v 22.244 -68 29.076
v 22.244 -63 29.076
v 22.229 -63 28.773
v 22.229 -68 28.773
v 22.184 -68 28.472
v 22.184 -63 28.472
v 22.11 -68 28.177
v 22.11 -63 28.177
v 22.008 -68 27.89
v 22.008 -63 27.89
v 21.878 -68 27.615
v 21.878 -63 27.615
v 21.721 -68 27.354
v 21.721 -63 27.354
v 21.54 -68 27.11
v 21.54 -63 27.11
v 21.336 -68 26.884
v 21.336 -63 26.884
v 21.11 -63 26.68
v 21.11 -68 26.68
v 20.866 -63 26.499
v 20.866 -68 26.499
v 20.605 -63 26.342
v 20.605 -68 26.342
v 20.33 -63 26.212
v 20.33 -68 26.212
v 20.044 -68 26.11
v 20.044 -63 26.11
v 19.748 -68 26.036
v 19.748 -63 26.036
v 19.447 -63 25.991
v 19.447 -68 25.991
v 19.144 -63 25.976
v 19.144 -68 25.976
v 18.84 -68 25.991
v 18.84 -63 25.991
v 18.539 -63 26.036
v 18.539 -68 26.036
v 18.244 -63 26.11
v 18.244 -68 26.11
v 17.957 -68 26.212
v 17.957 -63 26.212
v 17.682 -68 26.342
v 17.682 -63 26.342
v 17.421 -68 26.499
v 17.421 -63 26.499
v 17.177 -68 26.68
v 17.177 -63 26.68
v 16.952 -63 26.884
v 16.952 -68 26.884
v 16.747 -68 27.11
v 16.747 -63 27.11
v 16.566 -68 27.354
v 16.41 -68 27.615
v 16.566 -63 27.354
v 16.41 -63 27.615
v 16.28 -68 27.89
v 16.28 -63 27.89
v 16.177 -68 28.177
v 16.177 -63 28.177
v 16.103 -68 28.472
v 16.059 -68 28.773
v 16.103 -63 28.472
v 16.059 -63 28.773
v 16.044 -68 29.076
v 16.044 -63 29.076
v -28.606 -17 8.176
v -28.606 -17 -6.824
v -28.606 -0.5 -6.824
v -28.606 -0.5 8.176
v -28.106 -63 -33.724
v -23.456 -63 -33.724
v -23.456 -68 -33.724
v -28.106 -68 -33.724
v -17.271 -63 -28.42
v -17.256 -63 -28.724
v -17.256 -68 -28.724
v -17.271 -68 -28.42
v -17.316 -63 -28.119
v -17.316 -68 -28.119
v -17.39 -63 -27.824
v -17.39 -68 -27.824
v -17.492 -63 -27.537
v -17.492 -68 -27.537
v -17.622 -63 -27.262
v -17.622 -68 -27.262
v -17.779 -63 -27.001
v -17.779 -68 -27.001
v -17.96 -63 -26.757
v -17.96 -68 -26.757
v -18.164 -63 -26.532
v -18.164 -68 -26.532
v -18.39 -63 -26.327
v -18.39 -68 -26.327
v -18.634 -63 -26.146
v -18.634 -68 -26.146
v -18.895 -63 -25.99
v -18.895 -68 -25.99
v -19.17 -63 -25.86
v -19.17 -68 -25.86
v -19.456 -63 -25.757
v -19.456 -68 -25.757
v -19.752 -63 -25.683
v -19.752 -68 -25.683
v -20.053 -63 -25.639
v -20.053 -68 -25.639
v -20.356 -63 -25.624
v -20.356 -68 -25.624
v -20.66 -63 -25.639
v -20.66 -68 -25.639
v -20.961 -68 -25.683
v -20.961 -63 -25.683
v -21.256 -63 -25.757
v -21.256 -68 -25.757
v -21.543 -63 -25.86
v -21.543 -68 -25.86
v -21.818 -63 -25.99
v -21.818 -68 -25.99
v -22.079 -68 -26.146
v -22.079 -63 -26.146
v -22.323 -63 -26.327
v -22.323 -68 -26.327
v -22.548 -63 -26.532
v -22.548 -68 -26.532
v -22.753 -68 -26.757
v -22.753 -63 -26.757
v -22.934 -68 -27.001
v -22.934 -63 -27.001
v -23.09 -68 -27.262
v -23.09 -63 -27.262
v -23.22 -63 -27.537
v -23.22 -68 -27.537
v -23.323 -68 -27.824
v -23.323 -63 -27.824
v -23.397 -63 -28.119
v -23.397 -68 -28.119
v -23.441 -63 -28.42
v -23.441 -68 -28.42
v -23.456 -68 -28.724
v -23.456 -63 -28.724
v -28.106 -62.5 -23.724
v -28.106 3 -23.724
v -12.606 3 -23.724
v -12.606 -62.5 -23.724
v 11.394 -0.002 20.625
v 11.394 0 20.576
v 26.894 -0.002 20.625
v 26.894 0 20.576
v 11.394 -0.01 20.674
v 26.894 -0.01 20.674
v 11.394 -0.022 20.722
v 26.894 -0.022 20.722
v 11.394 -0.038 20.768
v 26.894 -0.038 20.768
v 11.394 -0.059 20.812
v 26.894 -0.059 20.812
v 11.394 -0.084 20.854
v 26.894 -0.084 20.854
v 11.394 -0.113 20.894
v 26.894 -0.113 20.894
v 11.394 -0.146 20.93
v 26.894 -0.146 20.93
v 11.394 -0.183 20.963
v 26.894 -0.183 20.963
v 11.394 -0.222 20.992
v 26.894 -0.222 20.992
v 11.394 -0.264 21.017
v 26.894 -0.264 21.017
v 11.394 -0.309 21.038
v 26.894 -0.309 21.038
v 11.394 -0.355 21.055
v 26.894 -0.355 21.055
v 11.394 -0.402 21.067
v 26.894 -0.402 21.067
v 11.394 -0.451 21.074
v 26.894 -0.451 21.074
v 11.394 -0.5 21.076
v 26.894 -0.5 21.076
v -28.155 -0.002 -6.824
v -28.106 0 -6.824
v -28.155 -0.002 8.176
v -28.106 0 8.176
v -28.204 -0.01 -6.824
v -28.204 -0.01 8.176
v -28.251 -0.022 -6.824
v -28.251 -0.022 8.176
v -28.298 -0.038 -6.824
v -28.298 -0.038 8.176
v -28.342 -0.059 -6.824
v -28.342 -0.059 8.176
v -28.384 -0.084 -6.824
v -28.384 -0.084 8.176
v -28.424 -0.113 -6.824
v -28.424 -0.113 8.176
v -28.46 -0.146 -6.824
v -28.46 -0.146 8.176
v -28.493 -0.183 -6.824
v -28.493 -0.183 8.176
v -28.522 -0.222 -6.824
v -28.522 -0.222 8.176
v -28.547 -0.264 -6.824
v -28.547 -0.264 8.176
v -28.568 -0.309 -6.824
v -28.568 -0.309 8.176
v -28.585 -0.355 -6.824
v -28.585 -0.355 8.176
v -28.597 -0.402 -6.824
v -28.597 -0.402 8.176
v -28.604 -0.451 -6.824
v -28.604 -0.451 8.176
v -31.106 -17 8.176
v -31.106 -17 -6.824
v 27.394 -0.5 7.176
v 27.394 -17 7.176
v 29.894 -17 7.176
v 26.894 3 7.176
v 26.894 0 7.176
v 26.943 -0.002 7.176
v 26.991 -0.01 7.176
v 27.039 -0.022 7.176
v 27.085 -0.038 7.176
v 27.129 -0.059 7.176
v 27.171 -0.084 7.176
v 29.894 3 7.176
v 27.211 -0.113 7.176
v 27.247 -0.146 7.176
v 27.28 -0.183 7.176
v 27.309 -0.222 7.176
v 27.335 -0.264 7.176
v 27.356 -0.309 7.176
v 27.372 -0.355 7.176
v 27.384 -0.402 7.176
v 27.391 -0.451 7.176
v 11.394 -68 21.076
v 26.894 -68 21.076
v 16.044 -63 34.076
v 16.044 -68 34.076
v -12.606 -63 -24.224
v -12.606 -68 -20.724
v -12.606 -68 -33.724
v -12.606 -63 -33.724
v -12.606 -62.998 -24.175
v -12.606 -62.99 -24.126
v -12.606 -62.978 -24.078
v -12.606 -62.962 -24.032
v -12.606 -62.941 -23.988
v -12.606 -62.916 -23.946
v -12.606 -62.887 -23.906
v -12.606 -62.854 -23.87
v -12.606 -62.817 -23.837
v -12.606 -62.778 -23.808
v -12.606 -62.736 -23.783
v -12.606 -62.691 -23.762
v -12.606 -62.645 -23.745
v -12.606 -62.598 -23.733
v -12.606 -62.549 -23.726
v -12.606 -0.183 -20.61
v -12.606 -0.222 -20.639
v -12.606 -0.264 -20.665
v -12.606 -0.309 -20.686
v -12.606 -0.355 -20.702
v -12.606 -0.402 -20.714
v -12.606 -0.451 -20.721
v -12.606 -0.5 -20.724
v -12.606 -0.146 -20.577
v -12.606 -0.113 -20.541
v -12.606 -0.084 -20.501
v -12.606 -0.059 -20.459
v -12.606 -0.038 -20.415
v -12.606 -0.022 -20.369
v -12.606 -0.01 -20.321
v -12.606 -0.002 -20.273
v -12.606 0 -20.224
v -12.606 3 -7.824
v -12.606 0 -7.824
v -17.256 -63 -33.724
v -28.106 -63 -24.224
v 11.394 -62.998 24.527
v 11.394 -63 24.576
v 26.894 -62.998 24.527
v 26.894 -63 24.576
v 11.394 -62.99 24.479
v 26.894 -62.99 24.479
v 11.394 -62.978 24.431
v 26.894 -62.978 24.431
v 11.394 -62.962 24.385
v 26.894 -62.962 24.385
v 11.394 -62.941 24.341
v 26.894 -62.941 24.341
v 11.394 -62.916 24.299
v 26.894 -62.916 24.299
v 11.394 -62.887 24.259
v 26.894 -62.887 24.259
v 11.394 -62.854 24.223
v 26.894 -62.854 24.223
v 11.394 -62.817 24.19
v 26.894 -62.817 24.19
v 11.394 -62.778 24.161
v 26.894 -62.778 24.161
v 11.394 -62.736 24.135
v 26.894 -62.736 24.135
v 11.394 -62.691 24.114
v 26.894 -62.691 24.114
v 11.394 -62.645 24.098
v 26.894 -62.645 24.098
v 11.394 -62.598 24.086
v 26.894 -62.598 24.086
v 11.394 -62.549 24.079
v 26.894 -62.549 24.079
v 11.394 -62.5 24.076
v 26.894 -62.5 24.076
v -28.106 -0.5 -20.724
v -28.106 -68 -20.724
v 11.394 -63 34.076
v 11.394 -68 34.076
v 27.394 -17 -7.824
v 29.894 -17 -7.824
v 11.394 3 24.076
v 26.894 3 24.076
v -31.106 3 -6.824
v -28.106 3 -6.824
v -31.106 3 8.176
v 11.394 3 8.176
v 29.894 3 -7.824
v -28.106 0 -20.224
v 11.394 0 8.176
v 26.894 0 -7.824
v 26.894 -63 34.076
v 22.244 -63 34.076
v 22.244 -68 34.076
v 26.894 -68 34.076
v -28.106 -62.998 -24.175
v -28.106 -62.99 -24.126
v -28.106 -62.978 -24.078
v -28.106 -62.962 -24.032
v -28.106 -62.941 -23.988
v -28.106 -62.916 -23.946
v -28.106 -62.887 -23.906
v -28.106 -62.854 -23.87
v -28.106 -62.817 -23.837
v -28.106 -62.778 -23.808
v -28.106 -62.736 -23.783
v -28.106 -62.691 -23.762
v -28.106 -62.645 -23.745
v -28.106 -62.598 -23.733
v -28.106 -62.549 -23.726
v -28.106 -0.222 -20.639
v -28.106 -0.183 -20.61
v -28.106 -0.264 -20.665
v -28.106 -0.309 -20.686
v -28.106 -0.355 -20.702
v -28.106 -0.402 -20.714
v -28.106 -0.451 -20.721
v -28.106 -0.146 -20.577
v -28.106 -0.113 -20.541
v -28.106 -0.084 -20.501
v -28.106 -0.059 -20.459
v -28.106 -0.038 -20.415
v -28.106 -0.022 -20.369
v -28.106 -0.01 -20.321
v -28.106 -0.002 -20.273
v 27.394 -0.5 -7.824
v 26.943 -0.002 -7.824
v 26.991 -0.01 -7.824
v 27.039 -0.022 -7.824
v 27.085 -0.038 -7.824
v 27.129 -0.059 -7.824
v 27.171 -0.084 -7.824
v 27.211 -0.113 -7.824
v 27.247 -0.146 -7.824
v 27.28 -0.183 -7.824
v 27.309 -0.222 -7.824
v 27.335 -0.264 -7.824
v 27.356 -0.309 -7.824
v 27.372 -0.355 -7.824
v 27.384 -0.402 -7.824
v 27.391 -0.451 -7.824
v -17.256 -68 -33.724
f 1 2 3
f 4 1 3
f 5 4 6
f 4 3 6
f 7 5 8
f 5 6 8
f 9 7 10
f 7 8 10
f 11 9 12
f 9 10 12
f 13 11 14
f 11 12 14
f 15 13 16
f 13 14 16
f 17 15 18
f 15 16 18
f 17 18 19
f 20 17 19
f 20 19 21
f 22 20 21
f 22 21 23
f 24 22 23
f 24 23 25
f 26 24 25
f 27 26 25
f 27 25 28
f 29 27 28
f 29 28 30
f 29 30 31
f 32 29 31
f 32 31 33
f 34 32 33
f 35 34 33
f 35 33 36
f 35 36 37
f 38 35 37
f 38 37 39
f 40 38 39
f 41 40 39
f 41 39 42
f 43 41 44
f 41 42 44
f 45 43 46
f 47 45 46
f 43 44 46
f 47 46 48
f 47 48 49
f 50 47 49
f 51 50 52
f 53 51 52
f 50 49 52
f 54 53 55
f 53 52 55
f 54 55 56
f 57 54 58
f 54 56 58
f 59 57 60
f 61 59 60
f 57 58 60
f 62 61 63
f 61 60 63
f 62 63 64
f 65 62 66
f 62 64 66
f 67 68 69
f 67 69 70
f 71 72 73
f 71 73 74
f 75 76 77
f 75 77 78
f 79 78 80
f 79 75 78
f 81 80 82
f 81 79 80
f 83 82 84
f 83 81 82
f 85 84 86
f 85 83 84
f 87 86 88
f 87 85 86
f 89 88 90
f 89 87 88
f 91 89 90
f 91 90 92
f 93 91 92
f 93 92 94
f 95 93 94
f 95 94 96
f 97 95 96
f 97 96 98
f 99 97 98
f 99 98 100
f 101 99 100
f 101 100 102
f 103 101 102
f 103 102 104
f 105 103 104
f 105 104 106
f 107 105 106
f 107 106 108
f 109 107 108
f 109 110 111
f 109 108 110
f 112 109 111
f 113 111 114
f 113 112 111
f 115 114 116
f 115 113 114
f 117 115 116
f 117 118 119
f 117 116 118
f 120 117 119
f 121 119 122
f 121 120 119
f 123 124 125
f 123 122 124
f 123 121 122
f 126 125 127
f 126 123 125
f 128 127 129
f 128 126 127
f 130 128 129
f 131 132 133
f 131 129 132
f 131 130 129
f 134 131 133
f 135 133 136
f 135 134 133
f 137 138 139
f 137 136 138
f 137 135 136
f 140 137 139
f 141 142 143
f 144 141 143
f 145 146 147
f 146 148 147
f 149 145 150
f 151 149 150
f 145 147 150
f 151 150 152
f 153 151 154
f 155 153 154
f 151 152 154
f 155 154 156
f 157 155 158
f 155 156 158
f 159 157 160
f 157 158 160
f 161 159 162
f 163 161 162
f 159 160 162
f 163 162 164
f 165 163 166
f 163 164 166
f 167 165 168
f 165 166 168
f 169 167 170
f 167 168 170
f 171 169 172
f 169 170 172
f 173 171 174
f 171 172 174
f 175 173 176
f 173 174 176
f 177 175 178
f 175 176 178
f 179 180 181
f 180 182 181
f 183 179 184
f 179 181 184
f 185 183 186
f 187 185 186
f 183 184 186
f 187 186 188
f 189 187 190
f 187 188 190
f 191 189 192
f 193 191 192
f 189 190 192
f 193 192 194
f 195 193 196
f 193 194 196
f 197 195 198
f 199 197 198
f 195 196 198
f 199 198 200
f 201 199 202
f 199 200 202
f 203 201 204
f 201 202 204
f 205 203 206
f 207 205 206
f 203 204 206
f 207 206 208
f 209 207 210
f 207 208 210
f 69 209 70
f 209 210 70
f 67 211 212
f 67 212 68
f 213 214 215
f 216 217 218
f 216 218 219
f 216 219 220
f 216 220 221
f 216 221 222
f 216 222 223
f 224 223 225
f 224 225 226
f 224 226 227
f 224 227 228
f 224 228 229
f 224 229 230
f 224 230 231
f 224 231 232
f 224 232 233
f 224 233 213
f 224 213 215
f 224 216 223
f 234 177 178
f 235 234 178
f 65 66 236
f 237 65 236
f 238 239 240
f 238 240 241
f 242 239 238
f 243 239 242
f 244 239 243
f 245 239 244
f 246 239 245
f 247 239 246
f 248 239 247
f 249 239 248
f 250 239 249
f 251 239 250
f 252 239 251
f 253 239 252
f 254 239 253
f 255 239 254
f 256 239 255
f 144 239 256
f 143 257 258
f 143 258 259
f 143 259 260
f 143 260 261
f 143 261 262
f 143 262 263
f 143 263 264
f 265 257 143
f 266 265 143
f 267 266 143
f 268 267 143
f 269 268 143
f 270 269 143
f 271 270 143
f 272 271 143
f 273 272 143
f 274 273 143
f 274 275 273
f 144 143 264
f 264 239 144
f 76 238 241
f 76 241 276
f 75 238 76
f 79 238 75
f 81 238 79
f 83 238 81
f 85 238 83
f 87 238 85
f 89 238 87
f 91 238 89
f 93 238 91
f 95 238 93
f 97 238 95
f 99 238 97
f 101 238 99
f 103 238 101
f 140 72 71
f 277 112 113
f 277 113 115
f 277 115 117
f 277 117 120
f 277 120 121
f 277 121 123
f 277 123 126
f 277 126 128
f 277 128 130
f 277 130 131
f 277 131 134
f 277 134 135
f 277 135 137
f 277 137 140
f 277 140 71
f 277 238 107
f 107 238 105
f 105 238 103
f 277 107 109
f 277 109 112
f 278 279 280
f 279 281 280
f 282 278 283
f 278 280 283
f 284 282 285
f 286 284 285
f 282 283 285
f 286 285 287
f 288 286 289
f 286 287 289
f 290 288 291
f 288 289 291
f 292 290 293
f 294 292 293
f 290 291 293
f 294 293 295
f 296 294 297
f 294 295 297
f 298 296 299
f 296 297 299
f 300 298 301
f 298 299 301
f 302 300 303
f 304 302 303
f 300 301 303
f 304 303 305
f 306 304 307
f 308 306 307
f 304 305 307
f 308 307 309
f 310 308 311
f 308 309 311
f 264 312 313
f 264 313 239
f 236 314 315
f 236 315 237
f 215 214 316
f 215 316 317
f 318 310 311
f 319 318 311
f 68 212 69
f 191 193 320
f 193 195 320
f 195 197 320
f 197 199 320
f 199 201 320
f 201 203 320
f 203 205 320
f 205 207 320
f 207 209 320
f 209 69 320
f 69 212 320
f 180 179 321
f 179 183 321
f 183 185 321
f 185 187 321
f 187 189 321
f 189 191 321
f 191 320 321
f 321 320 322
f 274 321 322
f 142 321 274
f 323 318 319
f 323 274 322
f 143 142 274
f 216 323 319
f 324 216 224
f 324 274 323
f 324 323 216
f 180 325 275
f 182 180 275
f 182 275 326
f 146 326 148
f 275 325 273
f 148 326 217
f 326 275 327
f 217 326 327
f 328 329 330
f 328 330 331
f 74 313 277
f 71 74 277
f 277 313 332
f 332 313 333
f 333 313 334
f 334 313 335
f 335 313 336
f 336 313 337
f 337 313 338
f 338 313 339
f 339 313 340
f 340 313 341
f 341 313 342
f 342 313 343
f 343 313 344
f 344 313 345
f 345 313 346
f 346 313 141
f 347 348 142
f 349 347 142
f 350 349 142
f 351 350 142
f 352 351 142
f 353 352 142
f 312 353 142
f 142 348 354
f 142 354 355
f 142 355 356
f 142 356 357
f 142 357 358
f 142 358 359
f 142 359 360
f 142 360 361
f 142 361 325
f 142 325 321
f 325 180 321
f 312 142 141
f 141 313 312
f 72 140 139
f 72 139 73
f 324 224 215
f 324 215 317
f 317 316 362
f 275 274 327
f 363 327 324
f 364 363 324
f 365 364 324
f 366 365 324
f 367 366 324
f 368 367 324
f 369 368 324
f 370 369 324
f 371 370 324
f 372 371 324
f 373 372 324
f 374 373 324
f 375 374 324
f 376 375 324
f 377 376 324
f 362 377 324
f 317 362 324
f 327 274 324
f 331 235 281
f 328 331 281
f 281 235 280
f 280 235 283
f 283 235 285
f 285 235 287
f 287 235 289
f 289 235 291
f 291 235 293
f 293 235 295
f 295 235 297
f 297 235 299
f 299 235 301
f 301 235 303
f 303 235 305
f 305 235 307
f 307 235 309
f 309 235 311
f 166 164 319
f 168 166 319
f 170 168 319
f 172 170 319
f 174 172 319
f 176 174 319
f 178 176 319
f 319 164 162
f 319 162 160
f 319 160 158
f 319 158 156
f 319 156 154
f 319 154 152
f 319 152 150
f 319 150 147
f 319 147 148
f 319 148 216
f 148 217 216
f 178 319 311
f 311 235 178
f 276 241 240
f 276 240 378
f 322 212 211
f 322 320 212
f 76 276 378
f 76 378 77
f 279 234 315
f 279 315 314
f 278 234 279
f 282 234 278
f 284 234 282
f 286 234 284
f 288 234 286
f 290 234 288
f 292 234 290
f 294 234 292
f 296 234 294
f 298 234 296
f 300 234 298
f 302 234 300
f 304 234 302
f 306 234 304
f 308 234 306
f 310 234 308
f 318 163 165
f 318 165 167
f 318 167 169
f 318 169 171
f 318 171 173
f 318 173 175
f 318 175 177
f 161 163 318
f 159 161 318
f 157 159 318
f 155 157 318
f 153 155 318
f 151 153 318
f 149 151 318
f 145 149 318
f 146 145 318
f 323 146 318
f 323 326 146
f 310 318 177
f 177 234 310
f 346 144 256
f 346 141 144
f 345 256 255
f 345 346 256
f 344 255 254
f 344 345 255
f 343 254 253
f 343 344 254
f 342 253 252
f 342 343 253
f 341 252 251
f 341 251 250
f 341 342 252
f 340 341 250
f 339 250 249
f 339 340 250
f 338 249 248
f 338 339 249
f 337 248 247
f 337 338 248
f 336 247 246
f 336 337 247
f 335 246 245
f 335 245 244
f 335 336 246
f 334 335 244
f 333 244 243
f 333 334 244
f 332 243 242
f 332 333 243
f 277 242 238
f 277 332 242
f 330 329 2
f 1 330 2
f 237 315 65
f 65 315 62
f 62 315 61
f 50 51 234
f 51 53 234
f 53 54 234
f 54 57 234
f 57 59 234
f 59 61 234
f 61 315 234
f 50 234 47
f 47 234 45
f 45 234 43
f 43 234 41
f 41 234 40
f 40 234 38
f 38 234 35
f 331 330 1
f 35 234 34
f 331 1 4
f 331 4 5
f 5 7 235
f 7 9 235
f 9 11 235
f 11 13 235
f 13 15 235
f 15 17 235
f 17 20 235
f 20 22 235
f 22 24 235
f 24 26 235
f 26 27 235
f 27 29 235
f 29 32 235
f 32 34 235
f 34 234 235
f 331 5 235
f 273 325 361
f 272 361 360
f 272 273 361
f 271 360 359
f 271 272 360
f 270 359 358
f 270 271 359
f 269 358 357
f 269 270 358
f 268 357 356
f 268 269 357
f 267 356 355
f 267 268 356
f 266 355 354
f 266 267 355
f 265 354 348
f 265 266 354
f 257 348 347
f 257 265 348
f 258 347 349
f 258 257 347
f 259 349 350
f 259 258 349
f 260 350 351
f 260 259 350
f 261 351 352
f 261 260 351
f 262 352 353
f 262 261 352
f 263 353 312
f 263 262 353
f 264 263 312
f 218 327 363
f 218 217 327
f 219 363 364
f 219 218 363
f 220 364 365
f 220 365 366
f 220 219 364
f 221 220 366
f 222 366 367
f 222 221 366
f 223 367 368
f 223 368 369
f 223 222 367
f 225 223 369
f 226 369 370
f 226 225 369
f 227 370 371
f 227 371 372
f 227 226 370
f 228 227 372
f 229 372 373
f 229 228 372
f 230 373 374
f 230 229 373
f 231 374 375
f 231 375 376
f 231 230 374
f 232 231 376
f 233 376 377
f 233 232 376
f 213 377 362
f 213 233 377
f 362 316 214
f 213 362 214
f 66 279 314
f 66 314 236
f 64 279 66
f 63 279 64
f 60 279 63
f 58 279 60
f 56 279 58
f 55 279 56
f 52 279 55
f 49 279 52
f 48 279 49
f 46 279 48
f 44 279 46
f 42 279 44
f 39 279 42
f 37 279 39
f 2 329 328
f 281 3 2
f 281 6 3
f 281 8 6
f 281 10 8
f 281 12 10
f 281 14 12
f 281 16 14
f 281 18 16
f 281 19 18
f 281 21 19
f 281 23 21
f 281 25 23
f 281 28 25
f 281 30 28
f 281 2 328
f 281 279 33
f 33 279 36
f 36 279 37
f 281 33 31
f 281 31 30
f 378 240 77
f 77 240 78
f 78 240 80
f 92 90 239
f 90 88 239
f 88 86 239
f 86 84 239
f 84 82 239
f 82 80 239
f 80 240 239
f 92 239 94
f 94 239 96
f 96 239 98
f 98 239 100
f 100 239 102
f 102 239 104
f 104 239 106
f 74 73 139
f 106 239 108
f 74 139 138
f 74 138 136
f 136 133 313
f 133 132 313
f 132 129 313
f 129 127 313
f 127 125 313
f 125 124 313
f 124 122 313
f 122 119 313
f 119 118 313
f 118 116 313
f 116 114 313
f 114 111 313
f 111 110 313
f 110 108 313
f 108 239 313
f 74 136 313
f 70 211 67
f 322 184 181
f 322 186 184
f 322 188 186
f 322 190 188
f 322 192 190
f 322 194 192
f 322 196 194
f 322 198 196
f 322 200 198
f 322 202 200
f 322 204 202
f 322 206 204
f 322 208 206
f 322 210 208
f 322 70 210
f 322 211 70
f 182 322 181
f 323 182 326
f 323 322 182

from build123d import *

# Parameters (mm, degrees)
SALIENTE_EXTRUIR1_DEPTH = 3
CROQUIS2_W              = 3
CROQUIS2_H              = 15
SALIENTE_EXTRUIR2_DEPTH = 3
CROQUIS3_W              = 2.5
CROQUIS3_H              = 15
SALIENTE_EXTRUIR3_DEPTH = 17
CROQUIS4_W              = 15.5
CROQUIS4_H              = 3
SALIENTE_EXTRUIR4_DEPTH = 68
CROQUIS5_W              = 15.5
CROQUIS5_H              = 5
SALIENTE_EXTRUIR5_DEPTH = 10
CROQUIS6_W              = 15.5
CROQUIS6_H              = 5
SALIENTE_EXTRUIR6_DEPTH = 10
CORTAR_EXTRUIR1_DEPTH   = 10
CORTAR_EXTRUIR2_DEPTH   = 10
REDONDEO2_R             = 0.5


with BuildPart() as part:
    # Croquis1 → Saliente-Extruir1 (new body)
    with BuildSketch(Plane(origin=(0, 0, 0), x_dir=(1, 0, 0), z_dir=(0, 1, 0))):
        Polygon((-28.106357332, -8.17639486), (11.393642668, -8.17639486), (11.393642668, -24.07639486), (26.893642668, -24.07639486), (26.893642668, -7.17639486), (26.893642668, 7.82360514), (-12.606357332, 7.82360514), (-12.606357332, 23.72360514), (-28.106357332, 23.72360514), (-28.106357332, 6.82360514), align=None)
    extrude(amount=SALIENTE_EXTRUIR1_DEPTH)

    # Croquis2 → Saliente-Extruir2 (add)
    with BuildSketch(Plane(origin=(0, 3, 0), x_dir=(1, 0, 0), z_dir=(0, 1, 0))):
        with Locations((28.393642668, 0.32360514)):
            Rectangle(CROQUIS2_W, CROQUIS2_H)
        with Locations((-29.606357332, -0.67639486)):
            Rectangle(CROQUIS2_W, CROQUIS2_H)
    extrude(amount=-SALIENTE_EXTRUIR2_DEPTH)

    # Croquis3 → Saliente-Extruir3 (add)
    with BuildSketch(Plane.XZ):
        with Locations((-29.856357332, 0.67639486)):
            Rectangle(CROQUIS3_W, CROQUIS3_H)
        with Locations((28.643642668, -0.32360514)):
            Rectangle(CROQUIS3_W, CROQUIS3_H)
    extrude(amount=SALIENTE_EXTRUIR3_DEPTH)

    # Croquis4 → Saliente-Extruir4 (add)
    with BuildSketch(Plane.XZ):
        with Locations((-20.356357332, -22.22360514)):
            Rectangle(CROQUIS4_W, CROQUIS4_H)
        with Locations((19.143642668, 22.57639486)):
            Rectangle(CROQUIS4_W, CROQUIS4_H)
    extrude(amount=SALIENTE_EXTRUIR4_DEPTH)

    # Croquis5 → Saliente-Extruir5 (add)
    with BuildSketch(Plane(origin=(0, 0, -23.72360514), x_dir=(-1, 0, 0), z_dir=(0, 0, -1))):
        with Locations((20.356357332, -65.5)):
            Rectangle(CROQUIS5_W, CROQUIS5_H)
    extrude(amount=SALIENTE_EXTRUIR5_DEPTH)

    # Croquis6 → Saliente-Extruir6 (add)
    with BuildSketch(Plane.XY.offset(24.07639486)):
        with Locations((19.143642668, -65.5)):
            Rectangle(CROQUIS6_W, CROQUIS6_H)
    extrude(amount=SALIENTE_EXTRUIR6_DEPTH)

    # Croquis7 → Cortar-Extruir1 (cut)
    with BuildSketch(Plane(origin=(0, -63, 0), x_dir=(1, 0, 0), z_dir=(0, 1, 0))):
        with BuildLine():
            Line((16.043642668, -29.07639486), (16.043642668, -34.07639486))
            Line((16.043642668, -34.07639486), (22.243642668, -34.07639486))
            Line((22.243642668, -34.07639486), (22.243642668, -29.07639486))
            ThreePointArc((22.243642668, -29.07639486), (19.143642668, -25.97639486), (16.043642668, -29.07639486))
        make_face()
    extrude(amount=-CORTAR_EXTRUIR1_DEPTH, mode=Mode.SUBTRACT)

    # Croquis8 → Cortar-Extruir2 (cut)
    with BuildSketch(Plane(origin=(0, -63, 0), x_dir=(1, 0, 0), z_dir=(0, 1, 0))):
        with BuildLine():
            Line((-23.456357332, 28.72360514), (-23.456357332, 33.72360514))
            Line((-23.456357332, 33.72360514), (-17.256357332, 33.72360514))
            Line((-17.256357332, 33.72360514), (-17.256357332, 28.72360514))
            ThreePointArc((-17.256357332, 28.72360514), (-20.356357332, 25.62360514), (-23.456357332, 28.72360514))
        make_face()
    extrude(amount=-CORTAR_EXTRUIR2_DEPTH, mode=Mode.SUBTRACT)

    # Redondeo2
    redondeo2_edges = [part.edges().sort_by_distance(p)[0] for p in [
        (19.143642668, -63, 24.07639486),
        (19.143642668, 0, 21.07639486),
        (27.393642668, 0, -0.32360514),
        (-28.606357332, 0, 0.67639486),
        (-20.356357332, 0, -20.72360514),
        (-20.356357332, -63, -23.72360514),
    ]]
    fillet(redondeo2_edges, radius=REDONDEO2_R)


solid = part.part
